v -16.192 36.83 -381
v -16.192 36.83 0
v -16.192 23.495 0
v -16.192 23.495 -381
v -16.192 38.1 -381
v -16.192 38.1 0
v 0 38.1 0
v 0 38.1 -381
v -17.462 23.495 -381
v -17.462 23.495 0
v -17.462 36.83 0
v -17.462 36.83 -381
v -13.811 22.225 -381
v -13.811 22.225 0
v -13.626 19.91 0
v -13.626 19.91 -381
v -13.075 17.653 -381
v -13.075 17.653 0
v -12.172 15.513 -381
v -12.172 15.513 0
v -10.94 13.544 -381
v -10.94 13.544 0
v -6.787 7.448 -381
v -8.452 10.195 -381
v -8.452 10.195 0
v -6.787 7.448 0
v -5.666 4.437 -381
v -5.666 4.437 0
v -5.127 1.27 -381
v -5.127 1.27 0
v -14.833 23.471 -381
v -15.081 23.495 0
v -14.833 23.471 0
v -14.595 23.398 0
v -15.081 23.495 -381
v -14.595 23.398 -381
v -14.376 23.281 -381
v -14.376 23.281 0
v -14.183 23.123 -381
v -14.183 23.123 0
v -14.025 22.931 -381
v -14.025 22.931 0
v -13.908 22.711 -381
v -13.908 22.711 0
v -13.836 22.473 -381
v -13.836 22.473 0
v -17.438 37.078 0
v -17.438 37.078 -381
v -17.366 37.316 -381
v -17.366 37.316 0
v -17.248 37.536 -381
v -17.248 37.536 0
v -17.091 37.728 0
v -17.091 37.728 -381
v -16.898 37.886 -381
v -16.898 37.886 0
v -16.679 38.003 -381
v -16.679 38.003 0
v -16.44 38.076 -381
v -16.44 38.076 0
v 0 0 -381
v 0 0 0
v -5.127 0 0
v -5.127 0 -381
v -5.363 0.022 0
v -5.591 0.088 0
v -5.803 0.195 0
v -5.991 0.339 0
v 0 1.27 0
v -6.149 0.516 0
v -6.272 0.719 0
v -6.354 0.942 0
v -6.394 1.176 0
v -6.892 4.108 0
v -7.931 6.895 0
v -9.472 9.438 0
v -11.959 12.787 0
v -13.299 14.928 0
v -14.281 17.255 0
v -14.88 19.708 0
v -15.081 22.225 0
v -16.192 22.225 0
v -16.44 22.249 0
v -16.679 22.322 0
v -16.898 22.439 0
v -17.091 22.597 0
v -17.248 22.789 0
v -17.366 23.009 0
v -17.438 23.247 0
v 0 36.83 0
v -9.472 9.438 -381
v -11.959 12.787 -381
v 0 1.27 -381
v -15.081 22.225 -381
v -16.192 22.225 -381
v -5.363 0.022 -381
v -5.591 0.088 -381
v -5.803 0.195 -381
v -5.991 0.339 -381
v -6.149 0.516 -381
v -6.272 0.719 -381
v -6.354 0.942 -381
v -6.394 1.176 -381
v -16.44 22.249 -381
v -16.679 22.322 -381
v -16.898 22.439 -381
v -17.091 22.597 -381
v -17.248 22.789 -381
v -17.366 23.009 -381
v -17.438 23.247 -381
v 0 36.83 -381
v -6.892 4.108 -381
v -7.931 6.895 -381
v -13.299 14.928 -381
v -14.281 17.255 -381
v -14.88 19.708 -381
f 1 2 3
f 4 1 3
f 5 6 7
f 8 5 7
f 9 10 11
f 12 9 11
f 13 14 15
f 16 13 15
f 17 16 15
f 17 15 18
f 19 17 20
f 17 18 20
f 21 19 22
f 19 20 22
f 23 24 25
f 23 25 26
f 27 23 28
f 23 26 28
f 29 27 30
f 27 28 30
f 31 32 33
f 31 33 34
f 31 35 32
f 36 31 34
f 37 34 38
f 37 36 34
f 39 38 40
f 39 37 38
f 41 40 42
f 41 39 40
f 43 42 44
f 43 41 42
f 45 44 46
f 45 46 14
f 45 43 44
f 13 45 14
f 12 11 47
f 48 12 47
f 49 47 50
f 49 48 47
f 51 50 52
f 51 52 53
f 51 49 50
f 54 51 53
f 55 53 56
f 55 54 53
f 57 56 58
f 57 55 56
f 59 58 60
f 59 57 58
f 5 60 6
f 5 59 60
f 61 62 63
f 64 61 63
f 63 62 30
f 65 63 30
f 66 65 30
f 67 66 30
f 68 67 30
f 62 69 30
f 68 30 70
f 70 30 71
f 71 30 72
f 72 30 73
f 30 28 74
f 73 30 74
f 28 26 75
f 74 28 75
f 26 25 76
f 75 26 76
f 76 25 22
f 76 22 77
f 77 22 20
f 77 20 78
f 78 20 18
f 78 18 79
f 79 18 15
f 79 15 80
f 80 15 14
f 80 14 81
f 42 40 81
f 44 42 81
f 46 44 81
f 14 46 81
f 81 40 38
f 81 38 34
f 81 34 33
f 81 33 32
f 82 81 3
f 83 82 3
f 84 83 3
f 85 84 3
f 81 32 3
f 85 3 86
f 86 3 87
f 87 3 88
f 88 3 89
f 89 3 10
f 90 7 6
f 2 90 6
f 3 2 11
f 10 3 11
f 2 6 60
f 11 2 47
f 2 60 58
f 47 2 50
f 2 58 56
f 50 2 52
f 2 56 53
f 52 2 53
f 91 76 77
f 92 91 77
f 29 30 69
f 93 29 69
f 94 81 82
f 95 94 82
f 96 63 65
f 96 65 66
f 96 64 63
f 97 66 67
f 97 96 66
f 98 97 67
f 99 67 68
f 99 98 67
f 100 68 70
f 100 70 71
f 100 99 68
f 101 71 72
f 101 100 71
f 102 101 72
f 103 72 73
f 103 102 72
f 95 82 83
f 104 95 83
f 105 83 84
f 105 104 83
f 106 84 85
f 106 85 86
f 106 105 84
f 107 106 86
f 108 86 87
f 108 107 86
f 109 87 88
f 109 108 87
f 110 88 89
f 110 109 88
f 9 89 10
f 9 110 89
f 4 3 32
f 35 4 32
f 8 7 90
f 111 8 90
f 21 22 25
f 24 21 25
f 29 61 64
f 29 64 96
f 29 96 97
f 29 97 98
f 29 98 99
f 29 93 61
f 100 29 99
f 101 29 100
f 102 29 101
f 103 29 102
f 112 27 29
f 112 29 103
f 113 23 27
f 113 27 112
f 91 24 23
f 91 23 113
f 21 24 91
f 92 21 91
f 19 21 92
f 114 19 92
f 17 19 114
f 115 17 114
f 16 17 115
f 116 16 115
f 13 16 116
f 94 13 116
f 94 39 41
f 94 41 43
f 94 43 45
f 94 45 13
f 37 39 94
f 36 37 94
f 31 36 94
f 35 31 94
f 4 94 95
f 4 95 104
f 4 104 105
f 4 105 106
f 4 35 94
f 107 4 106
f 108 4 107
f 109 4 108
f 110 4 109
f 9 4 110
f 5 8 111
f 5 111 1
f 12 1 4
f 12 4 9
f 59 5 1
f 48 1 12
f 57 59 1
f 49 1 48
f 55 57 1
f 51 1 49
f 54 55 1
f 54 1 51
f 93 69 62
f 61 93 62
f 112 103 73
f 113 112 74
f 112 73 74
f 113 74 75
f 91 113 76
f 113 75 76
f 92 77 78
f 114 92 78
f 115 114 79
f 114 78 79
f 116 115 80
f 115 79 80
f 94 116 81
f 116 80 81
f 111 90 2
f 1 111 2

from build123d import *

# Parameters (mm, degrees)
EXTRUDE_THIN1_DEPTH = 381
FILLET1_R           = 1.27


with BuildPart() as part:
    # Sketch1 → Extrude-Thin1 (new body)
    with BuildSketch(Plane.XY):
        with BuildLine():
            Line((0, 0), (-6.35, 0))
            ThreePointArc((-6.35, 0), (-7.150715566, 4.970497036), (-9.471846695, 9.438084357))
            Line((-9.471846695, 9.438084357), (-11.959403305, 12.786915643))
            ThreePointArc((-11.959403305, 12.786915643), (-14.280534434, 17.254502964), (-15.08125, 22.225))
            Line((-15.08125, 22.225), (-17.4625, 22.225))
            Line((-17.4625, 22.225), (-17.4625, 38.1))
            Line((-17.4625, 38.1), (0, 38.1))
            Line((0, 38.1), (0, 36.83))
            Line((0, 36.83), (-16.1925, 36.83))
            Line((-16.1925, 36.83), (-16.1925, 23.495))
            Line((-16.1925, 23.495), (-13.75574743, 23.495))
            ThreePointArc((-13.75574743, 23.495), (-13.261207377, 18.261141502), (-10.939897249, 13.544218358))
            Line((-10.939897249, 13.544218358), (-8.45234064, 10.195387073))
            ThreePointArc((-8.45234064, 10.195387073), (-6.155730596, 5.968907892), (-5.127232377, 1.27))
            Line((-5.127232377, 1.27), (0, 1.27))
            Line((0, 1.27), (0, 0))
        make_face()
    extrude(amount=-EXTRUDE_THIN1_DEPTH)

    # Fillet1
    fillet1_edges = [part.edges().sort_by_distance(p)[0] for p in [
        (-13.75574743, 23.495, -190.5),
        (-6.35, 0, -190.5),
        (-17.4625, 22.225, -190.5),
        (-17.4625, 38.1, -190.5),
    ]]
    fillet(fillet1_edges, radius=FILLET1_R)


solid = part.part
